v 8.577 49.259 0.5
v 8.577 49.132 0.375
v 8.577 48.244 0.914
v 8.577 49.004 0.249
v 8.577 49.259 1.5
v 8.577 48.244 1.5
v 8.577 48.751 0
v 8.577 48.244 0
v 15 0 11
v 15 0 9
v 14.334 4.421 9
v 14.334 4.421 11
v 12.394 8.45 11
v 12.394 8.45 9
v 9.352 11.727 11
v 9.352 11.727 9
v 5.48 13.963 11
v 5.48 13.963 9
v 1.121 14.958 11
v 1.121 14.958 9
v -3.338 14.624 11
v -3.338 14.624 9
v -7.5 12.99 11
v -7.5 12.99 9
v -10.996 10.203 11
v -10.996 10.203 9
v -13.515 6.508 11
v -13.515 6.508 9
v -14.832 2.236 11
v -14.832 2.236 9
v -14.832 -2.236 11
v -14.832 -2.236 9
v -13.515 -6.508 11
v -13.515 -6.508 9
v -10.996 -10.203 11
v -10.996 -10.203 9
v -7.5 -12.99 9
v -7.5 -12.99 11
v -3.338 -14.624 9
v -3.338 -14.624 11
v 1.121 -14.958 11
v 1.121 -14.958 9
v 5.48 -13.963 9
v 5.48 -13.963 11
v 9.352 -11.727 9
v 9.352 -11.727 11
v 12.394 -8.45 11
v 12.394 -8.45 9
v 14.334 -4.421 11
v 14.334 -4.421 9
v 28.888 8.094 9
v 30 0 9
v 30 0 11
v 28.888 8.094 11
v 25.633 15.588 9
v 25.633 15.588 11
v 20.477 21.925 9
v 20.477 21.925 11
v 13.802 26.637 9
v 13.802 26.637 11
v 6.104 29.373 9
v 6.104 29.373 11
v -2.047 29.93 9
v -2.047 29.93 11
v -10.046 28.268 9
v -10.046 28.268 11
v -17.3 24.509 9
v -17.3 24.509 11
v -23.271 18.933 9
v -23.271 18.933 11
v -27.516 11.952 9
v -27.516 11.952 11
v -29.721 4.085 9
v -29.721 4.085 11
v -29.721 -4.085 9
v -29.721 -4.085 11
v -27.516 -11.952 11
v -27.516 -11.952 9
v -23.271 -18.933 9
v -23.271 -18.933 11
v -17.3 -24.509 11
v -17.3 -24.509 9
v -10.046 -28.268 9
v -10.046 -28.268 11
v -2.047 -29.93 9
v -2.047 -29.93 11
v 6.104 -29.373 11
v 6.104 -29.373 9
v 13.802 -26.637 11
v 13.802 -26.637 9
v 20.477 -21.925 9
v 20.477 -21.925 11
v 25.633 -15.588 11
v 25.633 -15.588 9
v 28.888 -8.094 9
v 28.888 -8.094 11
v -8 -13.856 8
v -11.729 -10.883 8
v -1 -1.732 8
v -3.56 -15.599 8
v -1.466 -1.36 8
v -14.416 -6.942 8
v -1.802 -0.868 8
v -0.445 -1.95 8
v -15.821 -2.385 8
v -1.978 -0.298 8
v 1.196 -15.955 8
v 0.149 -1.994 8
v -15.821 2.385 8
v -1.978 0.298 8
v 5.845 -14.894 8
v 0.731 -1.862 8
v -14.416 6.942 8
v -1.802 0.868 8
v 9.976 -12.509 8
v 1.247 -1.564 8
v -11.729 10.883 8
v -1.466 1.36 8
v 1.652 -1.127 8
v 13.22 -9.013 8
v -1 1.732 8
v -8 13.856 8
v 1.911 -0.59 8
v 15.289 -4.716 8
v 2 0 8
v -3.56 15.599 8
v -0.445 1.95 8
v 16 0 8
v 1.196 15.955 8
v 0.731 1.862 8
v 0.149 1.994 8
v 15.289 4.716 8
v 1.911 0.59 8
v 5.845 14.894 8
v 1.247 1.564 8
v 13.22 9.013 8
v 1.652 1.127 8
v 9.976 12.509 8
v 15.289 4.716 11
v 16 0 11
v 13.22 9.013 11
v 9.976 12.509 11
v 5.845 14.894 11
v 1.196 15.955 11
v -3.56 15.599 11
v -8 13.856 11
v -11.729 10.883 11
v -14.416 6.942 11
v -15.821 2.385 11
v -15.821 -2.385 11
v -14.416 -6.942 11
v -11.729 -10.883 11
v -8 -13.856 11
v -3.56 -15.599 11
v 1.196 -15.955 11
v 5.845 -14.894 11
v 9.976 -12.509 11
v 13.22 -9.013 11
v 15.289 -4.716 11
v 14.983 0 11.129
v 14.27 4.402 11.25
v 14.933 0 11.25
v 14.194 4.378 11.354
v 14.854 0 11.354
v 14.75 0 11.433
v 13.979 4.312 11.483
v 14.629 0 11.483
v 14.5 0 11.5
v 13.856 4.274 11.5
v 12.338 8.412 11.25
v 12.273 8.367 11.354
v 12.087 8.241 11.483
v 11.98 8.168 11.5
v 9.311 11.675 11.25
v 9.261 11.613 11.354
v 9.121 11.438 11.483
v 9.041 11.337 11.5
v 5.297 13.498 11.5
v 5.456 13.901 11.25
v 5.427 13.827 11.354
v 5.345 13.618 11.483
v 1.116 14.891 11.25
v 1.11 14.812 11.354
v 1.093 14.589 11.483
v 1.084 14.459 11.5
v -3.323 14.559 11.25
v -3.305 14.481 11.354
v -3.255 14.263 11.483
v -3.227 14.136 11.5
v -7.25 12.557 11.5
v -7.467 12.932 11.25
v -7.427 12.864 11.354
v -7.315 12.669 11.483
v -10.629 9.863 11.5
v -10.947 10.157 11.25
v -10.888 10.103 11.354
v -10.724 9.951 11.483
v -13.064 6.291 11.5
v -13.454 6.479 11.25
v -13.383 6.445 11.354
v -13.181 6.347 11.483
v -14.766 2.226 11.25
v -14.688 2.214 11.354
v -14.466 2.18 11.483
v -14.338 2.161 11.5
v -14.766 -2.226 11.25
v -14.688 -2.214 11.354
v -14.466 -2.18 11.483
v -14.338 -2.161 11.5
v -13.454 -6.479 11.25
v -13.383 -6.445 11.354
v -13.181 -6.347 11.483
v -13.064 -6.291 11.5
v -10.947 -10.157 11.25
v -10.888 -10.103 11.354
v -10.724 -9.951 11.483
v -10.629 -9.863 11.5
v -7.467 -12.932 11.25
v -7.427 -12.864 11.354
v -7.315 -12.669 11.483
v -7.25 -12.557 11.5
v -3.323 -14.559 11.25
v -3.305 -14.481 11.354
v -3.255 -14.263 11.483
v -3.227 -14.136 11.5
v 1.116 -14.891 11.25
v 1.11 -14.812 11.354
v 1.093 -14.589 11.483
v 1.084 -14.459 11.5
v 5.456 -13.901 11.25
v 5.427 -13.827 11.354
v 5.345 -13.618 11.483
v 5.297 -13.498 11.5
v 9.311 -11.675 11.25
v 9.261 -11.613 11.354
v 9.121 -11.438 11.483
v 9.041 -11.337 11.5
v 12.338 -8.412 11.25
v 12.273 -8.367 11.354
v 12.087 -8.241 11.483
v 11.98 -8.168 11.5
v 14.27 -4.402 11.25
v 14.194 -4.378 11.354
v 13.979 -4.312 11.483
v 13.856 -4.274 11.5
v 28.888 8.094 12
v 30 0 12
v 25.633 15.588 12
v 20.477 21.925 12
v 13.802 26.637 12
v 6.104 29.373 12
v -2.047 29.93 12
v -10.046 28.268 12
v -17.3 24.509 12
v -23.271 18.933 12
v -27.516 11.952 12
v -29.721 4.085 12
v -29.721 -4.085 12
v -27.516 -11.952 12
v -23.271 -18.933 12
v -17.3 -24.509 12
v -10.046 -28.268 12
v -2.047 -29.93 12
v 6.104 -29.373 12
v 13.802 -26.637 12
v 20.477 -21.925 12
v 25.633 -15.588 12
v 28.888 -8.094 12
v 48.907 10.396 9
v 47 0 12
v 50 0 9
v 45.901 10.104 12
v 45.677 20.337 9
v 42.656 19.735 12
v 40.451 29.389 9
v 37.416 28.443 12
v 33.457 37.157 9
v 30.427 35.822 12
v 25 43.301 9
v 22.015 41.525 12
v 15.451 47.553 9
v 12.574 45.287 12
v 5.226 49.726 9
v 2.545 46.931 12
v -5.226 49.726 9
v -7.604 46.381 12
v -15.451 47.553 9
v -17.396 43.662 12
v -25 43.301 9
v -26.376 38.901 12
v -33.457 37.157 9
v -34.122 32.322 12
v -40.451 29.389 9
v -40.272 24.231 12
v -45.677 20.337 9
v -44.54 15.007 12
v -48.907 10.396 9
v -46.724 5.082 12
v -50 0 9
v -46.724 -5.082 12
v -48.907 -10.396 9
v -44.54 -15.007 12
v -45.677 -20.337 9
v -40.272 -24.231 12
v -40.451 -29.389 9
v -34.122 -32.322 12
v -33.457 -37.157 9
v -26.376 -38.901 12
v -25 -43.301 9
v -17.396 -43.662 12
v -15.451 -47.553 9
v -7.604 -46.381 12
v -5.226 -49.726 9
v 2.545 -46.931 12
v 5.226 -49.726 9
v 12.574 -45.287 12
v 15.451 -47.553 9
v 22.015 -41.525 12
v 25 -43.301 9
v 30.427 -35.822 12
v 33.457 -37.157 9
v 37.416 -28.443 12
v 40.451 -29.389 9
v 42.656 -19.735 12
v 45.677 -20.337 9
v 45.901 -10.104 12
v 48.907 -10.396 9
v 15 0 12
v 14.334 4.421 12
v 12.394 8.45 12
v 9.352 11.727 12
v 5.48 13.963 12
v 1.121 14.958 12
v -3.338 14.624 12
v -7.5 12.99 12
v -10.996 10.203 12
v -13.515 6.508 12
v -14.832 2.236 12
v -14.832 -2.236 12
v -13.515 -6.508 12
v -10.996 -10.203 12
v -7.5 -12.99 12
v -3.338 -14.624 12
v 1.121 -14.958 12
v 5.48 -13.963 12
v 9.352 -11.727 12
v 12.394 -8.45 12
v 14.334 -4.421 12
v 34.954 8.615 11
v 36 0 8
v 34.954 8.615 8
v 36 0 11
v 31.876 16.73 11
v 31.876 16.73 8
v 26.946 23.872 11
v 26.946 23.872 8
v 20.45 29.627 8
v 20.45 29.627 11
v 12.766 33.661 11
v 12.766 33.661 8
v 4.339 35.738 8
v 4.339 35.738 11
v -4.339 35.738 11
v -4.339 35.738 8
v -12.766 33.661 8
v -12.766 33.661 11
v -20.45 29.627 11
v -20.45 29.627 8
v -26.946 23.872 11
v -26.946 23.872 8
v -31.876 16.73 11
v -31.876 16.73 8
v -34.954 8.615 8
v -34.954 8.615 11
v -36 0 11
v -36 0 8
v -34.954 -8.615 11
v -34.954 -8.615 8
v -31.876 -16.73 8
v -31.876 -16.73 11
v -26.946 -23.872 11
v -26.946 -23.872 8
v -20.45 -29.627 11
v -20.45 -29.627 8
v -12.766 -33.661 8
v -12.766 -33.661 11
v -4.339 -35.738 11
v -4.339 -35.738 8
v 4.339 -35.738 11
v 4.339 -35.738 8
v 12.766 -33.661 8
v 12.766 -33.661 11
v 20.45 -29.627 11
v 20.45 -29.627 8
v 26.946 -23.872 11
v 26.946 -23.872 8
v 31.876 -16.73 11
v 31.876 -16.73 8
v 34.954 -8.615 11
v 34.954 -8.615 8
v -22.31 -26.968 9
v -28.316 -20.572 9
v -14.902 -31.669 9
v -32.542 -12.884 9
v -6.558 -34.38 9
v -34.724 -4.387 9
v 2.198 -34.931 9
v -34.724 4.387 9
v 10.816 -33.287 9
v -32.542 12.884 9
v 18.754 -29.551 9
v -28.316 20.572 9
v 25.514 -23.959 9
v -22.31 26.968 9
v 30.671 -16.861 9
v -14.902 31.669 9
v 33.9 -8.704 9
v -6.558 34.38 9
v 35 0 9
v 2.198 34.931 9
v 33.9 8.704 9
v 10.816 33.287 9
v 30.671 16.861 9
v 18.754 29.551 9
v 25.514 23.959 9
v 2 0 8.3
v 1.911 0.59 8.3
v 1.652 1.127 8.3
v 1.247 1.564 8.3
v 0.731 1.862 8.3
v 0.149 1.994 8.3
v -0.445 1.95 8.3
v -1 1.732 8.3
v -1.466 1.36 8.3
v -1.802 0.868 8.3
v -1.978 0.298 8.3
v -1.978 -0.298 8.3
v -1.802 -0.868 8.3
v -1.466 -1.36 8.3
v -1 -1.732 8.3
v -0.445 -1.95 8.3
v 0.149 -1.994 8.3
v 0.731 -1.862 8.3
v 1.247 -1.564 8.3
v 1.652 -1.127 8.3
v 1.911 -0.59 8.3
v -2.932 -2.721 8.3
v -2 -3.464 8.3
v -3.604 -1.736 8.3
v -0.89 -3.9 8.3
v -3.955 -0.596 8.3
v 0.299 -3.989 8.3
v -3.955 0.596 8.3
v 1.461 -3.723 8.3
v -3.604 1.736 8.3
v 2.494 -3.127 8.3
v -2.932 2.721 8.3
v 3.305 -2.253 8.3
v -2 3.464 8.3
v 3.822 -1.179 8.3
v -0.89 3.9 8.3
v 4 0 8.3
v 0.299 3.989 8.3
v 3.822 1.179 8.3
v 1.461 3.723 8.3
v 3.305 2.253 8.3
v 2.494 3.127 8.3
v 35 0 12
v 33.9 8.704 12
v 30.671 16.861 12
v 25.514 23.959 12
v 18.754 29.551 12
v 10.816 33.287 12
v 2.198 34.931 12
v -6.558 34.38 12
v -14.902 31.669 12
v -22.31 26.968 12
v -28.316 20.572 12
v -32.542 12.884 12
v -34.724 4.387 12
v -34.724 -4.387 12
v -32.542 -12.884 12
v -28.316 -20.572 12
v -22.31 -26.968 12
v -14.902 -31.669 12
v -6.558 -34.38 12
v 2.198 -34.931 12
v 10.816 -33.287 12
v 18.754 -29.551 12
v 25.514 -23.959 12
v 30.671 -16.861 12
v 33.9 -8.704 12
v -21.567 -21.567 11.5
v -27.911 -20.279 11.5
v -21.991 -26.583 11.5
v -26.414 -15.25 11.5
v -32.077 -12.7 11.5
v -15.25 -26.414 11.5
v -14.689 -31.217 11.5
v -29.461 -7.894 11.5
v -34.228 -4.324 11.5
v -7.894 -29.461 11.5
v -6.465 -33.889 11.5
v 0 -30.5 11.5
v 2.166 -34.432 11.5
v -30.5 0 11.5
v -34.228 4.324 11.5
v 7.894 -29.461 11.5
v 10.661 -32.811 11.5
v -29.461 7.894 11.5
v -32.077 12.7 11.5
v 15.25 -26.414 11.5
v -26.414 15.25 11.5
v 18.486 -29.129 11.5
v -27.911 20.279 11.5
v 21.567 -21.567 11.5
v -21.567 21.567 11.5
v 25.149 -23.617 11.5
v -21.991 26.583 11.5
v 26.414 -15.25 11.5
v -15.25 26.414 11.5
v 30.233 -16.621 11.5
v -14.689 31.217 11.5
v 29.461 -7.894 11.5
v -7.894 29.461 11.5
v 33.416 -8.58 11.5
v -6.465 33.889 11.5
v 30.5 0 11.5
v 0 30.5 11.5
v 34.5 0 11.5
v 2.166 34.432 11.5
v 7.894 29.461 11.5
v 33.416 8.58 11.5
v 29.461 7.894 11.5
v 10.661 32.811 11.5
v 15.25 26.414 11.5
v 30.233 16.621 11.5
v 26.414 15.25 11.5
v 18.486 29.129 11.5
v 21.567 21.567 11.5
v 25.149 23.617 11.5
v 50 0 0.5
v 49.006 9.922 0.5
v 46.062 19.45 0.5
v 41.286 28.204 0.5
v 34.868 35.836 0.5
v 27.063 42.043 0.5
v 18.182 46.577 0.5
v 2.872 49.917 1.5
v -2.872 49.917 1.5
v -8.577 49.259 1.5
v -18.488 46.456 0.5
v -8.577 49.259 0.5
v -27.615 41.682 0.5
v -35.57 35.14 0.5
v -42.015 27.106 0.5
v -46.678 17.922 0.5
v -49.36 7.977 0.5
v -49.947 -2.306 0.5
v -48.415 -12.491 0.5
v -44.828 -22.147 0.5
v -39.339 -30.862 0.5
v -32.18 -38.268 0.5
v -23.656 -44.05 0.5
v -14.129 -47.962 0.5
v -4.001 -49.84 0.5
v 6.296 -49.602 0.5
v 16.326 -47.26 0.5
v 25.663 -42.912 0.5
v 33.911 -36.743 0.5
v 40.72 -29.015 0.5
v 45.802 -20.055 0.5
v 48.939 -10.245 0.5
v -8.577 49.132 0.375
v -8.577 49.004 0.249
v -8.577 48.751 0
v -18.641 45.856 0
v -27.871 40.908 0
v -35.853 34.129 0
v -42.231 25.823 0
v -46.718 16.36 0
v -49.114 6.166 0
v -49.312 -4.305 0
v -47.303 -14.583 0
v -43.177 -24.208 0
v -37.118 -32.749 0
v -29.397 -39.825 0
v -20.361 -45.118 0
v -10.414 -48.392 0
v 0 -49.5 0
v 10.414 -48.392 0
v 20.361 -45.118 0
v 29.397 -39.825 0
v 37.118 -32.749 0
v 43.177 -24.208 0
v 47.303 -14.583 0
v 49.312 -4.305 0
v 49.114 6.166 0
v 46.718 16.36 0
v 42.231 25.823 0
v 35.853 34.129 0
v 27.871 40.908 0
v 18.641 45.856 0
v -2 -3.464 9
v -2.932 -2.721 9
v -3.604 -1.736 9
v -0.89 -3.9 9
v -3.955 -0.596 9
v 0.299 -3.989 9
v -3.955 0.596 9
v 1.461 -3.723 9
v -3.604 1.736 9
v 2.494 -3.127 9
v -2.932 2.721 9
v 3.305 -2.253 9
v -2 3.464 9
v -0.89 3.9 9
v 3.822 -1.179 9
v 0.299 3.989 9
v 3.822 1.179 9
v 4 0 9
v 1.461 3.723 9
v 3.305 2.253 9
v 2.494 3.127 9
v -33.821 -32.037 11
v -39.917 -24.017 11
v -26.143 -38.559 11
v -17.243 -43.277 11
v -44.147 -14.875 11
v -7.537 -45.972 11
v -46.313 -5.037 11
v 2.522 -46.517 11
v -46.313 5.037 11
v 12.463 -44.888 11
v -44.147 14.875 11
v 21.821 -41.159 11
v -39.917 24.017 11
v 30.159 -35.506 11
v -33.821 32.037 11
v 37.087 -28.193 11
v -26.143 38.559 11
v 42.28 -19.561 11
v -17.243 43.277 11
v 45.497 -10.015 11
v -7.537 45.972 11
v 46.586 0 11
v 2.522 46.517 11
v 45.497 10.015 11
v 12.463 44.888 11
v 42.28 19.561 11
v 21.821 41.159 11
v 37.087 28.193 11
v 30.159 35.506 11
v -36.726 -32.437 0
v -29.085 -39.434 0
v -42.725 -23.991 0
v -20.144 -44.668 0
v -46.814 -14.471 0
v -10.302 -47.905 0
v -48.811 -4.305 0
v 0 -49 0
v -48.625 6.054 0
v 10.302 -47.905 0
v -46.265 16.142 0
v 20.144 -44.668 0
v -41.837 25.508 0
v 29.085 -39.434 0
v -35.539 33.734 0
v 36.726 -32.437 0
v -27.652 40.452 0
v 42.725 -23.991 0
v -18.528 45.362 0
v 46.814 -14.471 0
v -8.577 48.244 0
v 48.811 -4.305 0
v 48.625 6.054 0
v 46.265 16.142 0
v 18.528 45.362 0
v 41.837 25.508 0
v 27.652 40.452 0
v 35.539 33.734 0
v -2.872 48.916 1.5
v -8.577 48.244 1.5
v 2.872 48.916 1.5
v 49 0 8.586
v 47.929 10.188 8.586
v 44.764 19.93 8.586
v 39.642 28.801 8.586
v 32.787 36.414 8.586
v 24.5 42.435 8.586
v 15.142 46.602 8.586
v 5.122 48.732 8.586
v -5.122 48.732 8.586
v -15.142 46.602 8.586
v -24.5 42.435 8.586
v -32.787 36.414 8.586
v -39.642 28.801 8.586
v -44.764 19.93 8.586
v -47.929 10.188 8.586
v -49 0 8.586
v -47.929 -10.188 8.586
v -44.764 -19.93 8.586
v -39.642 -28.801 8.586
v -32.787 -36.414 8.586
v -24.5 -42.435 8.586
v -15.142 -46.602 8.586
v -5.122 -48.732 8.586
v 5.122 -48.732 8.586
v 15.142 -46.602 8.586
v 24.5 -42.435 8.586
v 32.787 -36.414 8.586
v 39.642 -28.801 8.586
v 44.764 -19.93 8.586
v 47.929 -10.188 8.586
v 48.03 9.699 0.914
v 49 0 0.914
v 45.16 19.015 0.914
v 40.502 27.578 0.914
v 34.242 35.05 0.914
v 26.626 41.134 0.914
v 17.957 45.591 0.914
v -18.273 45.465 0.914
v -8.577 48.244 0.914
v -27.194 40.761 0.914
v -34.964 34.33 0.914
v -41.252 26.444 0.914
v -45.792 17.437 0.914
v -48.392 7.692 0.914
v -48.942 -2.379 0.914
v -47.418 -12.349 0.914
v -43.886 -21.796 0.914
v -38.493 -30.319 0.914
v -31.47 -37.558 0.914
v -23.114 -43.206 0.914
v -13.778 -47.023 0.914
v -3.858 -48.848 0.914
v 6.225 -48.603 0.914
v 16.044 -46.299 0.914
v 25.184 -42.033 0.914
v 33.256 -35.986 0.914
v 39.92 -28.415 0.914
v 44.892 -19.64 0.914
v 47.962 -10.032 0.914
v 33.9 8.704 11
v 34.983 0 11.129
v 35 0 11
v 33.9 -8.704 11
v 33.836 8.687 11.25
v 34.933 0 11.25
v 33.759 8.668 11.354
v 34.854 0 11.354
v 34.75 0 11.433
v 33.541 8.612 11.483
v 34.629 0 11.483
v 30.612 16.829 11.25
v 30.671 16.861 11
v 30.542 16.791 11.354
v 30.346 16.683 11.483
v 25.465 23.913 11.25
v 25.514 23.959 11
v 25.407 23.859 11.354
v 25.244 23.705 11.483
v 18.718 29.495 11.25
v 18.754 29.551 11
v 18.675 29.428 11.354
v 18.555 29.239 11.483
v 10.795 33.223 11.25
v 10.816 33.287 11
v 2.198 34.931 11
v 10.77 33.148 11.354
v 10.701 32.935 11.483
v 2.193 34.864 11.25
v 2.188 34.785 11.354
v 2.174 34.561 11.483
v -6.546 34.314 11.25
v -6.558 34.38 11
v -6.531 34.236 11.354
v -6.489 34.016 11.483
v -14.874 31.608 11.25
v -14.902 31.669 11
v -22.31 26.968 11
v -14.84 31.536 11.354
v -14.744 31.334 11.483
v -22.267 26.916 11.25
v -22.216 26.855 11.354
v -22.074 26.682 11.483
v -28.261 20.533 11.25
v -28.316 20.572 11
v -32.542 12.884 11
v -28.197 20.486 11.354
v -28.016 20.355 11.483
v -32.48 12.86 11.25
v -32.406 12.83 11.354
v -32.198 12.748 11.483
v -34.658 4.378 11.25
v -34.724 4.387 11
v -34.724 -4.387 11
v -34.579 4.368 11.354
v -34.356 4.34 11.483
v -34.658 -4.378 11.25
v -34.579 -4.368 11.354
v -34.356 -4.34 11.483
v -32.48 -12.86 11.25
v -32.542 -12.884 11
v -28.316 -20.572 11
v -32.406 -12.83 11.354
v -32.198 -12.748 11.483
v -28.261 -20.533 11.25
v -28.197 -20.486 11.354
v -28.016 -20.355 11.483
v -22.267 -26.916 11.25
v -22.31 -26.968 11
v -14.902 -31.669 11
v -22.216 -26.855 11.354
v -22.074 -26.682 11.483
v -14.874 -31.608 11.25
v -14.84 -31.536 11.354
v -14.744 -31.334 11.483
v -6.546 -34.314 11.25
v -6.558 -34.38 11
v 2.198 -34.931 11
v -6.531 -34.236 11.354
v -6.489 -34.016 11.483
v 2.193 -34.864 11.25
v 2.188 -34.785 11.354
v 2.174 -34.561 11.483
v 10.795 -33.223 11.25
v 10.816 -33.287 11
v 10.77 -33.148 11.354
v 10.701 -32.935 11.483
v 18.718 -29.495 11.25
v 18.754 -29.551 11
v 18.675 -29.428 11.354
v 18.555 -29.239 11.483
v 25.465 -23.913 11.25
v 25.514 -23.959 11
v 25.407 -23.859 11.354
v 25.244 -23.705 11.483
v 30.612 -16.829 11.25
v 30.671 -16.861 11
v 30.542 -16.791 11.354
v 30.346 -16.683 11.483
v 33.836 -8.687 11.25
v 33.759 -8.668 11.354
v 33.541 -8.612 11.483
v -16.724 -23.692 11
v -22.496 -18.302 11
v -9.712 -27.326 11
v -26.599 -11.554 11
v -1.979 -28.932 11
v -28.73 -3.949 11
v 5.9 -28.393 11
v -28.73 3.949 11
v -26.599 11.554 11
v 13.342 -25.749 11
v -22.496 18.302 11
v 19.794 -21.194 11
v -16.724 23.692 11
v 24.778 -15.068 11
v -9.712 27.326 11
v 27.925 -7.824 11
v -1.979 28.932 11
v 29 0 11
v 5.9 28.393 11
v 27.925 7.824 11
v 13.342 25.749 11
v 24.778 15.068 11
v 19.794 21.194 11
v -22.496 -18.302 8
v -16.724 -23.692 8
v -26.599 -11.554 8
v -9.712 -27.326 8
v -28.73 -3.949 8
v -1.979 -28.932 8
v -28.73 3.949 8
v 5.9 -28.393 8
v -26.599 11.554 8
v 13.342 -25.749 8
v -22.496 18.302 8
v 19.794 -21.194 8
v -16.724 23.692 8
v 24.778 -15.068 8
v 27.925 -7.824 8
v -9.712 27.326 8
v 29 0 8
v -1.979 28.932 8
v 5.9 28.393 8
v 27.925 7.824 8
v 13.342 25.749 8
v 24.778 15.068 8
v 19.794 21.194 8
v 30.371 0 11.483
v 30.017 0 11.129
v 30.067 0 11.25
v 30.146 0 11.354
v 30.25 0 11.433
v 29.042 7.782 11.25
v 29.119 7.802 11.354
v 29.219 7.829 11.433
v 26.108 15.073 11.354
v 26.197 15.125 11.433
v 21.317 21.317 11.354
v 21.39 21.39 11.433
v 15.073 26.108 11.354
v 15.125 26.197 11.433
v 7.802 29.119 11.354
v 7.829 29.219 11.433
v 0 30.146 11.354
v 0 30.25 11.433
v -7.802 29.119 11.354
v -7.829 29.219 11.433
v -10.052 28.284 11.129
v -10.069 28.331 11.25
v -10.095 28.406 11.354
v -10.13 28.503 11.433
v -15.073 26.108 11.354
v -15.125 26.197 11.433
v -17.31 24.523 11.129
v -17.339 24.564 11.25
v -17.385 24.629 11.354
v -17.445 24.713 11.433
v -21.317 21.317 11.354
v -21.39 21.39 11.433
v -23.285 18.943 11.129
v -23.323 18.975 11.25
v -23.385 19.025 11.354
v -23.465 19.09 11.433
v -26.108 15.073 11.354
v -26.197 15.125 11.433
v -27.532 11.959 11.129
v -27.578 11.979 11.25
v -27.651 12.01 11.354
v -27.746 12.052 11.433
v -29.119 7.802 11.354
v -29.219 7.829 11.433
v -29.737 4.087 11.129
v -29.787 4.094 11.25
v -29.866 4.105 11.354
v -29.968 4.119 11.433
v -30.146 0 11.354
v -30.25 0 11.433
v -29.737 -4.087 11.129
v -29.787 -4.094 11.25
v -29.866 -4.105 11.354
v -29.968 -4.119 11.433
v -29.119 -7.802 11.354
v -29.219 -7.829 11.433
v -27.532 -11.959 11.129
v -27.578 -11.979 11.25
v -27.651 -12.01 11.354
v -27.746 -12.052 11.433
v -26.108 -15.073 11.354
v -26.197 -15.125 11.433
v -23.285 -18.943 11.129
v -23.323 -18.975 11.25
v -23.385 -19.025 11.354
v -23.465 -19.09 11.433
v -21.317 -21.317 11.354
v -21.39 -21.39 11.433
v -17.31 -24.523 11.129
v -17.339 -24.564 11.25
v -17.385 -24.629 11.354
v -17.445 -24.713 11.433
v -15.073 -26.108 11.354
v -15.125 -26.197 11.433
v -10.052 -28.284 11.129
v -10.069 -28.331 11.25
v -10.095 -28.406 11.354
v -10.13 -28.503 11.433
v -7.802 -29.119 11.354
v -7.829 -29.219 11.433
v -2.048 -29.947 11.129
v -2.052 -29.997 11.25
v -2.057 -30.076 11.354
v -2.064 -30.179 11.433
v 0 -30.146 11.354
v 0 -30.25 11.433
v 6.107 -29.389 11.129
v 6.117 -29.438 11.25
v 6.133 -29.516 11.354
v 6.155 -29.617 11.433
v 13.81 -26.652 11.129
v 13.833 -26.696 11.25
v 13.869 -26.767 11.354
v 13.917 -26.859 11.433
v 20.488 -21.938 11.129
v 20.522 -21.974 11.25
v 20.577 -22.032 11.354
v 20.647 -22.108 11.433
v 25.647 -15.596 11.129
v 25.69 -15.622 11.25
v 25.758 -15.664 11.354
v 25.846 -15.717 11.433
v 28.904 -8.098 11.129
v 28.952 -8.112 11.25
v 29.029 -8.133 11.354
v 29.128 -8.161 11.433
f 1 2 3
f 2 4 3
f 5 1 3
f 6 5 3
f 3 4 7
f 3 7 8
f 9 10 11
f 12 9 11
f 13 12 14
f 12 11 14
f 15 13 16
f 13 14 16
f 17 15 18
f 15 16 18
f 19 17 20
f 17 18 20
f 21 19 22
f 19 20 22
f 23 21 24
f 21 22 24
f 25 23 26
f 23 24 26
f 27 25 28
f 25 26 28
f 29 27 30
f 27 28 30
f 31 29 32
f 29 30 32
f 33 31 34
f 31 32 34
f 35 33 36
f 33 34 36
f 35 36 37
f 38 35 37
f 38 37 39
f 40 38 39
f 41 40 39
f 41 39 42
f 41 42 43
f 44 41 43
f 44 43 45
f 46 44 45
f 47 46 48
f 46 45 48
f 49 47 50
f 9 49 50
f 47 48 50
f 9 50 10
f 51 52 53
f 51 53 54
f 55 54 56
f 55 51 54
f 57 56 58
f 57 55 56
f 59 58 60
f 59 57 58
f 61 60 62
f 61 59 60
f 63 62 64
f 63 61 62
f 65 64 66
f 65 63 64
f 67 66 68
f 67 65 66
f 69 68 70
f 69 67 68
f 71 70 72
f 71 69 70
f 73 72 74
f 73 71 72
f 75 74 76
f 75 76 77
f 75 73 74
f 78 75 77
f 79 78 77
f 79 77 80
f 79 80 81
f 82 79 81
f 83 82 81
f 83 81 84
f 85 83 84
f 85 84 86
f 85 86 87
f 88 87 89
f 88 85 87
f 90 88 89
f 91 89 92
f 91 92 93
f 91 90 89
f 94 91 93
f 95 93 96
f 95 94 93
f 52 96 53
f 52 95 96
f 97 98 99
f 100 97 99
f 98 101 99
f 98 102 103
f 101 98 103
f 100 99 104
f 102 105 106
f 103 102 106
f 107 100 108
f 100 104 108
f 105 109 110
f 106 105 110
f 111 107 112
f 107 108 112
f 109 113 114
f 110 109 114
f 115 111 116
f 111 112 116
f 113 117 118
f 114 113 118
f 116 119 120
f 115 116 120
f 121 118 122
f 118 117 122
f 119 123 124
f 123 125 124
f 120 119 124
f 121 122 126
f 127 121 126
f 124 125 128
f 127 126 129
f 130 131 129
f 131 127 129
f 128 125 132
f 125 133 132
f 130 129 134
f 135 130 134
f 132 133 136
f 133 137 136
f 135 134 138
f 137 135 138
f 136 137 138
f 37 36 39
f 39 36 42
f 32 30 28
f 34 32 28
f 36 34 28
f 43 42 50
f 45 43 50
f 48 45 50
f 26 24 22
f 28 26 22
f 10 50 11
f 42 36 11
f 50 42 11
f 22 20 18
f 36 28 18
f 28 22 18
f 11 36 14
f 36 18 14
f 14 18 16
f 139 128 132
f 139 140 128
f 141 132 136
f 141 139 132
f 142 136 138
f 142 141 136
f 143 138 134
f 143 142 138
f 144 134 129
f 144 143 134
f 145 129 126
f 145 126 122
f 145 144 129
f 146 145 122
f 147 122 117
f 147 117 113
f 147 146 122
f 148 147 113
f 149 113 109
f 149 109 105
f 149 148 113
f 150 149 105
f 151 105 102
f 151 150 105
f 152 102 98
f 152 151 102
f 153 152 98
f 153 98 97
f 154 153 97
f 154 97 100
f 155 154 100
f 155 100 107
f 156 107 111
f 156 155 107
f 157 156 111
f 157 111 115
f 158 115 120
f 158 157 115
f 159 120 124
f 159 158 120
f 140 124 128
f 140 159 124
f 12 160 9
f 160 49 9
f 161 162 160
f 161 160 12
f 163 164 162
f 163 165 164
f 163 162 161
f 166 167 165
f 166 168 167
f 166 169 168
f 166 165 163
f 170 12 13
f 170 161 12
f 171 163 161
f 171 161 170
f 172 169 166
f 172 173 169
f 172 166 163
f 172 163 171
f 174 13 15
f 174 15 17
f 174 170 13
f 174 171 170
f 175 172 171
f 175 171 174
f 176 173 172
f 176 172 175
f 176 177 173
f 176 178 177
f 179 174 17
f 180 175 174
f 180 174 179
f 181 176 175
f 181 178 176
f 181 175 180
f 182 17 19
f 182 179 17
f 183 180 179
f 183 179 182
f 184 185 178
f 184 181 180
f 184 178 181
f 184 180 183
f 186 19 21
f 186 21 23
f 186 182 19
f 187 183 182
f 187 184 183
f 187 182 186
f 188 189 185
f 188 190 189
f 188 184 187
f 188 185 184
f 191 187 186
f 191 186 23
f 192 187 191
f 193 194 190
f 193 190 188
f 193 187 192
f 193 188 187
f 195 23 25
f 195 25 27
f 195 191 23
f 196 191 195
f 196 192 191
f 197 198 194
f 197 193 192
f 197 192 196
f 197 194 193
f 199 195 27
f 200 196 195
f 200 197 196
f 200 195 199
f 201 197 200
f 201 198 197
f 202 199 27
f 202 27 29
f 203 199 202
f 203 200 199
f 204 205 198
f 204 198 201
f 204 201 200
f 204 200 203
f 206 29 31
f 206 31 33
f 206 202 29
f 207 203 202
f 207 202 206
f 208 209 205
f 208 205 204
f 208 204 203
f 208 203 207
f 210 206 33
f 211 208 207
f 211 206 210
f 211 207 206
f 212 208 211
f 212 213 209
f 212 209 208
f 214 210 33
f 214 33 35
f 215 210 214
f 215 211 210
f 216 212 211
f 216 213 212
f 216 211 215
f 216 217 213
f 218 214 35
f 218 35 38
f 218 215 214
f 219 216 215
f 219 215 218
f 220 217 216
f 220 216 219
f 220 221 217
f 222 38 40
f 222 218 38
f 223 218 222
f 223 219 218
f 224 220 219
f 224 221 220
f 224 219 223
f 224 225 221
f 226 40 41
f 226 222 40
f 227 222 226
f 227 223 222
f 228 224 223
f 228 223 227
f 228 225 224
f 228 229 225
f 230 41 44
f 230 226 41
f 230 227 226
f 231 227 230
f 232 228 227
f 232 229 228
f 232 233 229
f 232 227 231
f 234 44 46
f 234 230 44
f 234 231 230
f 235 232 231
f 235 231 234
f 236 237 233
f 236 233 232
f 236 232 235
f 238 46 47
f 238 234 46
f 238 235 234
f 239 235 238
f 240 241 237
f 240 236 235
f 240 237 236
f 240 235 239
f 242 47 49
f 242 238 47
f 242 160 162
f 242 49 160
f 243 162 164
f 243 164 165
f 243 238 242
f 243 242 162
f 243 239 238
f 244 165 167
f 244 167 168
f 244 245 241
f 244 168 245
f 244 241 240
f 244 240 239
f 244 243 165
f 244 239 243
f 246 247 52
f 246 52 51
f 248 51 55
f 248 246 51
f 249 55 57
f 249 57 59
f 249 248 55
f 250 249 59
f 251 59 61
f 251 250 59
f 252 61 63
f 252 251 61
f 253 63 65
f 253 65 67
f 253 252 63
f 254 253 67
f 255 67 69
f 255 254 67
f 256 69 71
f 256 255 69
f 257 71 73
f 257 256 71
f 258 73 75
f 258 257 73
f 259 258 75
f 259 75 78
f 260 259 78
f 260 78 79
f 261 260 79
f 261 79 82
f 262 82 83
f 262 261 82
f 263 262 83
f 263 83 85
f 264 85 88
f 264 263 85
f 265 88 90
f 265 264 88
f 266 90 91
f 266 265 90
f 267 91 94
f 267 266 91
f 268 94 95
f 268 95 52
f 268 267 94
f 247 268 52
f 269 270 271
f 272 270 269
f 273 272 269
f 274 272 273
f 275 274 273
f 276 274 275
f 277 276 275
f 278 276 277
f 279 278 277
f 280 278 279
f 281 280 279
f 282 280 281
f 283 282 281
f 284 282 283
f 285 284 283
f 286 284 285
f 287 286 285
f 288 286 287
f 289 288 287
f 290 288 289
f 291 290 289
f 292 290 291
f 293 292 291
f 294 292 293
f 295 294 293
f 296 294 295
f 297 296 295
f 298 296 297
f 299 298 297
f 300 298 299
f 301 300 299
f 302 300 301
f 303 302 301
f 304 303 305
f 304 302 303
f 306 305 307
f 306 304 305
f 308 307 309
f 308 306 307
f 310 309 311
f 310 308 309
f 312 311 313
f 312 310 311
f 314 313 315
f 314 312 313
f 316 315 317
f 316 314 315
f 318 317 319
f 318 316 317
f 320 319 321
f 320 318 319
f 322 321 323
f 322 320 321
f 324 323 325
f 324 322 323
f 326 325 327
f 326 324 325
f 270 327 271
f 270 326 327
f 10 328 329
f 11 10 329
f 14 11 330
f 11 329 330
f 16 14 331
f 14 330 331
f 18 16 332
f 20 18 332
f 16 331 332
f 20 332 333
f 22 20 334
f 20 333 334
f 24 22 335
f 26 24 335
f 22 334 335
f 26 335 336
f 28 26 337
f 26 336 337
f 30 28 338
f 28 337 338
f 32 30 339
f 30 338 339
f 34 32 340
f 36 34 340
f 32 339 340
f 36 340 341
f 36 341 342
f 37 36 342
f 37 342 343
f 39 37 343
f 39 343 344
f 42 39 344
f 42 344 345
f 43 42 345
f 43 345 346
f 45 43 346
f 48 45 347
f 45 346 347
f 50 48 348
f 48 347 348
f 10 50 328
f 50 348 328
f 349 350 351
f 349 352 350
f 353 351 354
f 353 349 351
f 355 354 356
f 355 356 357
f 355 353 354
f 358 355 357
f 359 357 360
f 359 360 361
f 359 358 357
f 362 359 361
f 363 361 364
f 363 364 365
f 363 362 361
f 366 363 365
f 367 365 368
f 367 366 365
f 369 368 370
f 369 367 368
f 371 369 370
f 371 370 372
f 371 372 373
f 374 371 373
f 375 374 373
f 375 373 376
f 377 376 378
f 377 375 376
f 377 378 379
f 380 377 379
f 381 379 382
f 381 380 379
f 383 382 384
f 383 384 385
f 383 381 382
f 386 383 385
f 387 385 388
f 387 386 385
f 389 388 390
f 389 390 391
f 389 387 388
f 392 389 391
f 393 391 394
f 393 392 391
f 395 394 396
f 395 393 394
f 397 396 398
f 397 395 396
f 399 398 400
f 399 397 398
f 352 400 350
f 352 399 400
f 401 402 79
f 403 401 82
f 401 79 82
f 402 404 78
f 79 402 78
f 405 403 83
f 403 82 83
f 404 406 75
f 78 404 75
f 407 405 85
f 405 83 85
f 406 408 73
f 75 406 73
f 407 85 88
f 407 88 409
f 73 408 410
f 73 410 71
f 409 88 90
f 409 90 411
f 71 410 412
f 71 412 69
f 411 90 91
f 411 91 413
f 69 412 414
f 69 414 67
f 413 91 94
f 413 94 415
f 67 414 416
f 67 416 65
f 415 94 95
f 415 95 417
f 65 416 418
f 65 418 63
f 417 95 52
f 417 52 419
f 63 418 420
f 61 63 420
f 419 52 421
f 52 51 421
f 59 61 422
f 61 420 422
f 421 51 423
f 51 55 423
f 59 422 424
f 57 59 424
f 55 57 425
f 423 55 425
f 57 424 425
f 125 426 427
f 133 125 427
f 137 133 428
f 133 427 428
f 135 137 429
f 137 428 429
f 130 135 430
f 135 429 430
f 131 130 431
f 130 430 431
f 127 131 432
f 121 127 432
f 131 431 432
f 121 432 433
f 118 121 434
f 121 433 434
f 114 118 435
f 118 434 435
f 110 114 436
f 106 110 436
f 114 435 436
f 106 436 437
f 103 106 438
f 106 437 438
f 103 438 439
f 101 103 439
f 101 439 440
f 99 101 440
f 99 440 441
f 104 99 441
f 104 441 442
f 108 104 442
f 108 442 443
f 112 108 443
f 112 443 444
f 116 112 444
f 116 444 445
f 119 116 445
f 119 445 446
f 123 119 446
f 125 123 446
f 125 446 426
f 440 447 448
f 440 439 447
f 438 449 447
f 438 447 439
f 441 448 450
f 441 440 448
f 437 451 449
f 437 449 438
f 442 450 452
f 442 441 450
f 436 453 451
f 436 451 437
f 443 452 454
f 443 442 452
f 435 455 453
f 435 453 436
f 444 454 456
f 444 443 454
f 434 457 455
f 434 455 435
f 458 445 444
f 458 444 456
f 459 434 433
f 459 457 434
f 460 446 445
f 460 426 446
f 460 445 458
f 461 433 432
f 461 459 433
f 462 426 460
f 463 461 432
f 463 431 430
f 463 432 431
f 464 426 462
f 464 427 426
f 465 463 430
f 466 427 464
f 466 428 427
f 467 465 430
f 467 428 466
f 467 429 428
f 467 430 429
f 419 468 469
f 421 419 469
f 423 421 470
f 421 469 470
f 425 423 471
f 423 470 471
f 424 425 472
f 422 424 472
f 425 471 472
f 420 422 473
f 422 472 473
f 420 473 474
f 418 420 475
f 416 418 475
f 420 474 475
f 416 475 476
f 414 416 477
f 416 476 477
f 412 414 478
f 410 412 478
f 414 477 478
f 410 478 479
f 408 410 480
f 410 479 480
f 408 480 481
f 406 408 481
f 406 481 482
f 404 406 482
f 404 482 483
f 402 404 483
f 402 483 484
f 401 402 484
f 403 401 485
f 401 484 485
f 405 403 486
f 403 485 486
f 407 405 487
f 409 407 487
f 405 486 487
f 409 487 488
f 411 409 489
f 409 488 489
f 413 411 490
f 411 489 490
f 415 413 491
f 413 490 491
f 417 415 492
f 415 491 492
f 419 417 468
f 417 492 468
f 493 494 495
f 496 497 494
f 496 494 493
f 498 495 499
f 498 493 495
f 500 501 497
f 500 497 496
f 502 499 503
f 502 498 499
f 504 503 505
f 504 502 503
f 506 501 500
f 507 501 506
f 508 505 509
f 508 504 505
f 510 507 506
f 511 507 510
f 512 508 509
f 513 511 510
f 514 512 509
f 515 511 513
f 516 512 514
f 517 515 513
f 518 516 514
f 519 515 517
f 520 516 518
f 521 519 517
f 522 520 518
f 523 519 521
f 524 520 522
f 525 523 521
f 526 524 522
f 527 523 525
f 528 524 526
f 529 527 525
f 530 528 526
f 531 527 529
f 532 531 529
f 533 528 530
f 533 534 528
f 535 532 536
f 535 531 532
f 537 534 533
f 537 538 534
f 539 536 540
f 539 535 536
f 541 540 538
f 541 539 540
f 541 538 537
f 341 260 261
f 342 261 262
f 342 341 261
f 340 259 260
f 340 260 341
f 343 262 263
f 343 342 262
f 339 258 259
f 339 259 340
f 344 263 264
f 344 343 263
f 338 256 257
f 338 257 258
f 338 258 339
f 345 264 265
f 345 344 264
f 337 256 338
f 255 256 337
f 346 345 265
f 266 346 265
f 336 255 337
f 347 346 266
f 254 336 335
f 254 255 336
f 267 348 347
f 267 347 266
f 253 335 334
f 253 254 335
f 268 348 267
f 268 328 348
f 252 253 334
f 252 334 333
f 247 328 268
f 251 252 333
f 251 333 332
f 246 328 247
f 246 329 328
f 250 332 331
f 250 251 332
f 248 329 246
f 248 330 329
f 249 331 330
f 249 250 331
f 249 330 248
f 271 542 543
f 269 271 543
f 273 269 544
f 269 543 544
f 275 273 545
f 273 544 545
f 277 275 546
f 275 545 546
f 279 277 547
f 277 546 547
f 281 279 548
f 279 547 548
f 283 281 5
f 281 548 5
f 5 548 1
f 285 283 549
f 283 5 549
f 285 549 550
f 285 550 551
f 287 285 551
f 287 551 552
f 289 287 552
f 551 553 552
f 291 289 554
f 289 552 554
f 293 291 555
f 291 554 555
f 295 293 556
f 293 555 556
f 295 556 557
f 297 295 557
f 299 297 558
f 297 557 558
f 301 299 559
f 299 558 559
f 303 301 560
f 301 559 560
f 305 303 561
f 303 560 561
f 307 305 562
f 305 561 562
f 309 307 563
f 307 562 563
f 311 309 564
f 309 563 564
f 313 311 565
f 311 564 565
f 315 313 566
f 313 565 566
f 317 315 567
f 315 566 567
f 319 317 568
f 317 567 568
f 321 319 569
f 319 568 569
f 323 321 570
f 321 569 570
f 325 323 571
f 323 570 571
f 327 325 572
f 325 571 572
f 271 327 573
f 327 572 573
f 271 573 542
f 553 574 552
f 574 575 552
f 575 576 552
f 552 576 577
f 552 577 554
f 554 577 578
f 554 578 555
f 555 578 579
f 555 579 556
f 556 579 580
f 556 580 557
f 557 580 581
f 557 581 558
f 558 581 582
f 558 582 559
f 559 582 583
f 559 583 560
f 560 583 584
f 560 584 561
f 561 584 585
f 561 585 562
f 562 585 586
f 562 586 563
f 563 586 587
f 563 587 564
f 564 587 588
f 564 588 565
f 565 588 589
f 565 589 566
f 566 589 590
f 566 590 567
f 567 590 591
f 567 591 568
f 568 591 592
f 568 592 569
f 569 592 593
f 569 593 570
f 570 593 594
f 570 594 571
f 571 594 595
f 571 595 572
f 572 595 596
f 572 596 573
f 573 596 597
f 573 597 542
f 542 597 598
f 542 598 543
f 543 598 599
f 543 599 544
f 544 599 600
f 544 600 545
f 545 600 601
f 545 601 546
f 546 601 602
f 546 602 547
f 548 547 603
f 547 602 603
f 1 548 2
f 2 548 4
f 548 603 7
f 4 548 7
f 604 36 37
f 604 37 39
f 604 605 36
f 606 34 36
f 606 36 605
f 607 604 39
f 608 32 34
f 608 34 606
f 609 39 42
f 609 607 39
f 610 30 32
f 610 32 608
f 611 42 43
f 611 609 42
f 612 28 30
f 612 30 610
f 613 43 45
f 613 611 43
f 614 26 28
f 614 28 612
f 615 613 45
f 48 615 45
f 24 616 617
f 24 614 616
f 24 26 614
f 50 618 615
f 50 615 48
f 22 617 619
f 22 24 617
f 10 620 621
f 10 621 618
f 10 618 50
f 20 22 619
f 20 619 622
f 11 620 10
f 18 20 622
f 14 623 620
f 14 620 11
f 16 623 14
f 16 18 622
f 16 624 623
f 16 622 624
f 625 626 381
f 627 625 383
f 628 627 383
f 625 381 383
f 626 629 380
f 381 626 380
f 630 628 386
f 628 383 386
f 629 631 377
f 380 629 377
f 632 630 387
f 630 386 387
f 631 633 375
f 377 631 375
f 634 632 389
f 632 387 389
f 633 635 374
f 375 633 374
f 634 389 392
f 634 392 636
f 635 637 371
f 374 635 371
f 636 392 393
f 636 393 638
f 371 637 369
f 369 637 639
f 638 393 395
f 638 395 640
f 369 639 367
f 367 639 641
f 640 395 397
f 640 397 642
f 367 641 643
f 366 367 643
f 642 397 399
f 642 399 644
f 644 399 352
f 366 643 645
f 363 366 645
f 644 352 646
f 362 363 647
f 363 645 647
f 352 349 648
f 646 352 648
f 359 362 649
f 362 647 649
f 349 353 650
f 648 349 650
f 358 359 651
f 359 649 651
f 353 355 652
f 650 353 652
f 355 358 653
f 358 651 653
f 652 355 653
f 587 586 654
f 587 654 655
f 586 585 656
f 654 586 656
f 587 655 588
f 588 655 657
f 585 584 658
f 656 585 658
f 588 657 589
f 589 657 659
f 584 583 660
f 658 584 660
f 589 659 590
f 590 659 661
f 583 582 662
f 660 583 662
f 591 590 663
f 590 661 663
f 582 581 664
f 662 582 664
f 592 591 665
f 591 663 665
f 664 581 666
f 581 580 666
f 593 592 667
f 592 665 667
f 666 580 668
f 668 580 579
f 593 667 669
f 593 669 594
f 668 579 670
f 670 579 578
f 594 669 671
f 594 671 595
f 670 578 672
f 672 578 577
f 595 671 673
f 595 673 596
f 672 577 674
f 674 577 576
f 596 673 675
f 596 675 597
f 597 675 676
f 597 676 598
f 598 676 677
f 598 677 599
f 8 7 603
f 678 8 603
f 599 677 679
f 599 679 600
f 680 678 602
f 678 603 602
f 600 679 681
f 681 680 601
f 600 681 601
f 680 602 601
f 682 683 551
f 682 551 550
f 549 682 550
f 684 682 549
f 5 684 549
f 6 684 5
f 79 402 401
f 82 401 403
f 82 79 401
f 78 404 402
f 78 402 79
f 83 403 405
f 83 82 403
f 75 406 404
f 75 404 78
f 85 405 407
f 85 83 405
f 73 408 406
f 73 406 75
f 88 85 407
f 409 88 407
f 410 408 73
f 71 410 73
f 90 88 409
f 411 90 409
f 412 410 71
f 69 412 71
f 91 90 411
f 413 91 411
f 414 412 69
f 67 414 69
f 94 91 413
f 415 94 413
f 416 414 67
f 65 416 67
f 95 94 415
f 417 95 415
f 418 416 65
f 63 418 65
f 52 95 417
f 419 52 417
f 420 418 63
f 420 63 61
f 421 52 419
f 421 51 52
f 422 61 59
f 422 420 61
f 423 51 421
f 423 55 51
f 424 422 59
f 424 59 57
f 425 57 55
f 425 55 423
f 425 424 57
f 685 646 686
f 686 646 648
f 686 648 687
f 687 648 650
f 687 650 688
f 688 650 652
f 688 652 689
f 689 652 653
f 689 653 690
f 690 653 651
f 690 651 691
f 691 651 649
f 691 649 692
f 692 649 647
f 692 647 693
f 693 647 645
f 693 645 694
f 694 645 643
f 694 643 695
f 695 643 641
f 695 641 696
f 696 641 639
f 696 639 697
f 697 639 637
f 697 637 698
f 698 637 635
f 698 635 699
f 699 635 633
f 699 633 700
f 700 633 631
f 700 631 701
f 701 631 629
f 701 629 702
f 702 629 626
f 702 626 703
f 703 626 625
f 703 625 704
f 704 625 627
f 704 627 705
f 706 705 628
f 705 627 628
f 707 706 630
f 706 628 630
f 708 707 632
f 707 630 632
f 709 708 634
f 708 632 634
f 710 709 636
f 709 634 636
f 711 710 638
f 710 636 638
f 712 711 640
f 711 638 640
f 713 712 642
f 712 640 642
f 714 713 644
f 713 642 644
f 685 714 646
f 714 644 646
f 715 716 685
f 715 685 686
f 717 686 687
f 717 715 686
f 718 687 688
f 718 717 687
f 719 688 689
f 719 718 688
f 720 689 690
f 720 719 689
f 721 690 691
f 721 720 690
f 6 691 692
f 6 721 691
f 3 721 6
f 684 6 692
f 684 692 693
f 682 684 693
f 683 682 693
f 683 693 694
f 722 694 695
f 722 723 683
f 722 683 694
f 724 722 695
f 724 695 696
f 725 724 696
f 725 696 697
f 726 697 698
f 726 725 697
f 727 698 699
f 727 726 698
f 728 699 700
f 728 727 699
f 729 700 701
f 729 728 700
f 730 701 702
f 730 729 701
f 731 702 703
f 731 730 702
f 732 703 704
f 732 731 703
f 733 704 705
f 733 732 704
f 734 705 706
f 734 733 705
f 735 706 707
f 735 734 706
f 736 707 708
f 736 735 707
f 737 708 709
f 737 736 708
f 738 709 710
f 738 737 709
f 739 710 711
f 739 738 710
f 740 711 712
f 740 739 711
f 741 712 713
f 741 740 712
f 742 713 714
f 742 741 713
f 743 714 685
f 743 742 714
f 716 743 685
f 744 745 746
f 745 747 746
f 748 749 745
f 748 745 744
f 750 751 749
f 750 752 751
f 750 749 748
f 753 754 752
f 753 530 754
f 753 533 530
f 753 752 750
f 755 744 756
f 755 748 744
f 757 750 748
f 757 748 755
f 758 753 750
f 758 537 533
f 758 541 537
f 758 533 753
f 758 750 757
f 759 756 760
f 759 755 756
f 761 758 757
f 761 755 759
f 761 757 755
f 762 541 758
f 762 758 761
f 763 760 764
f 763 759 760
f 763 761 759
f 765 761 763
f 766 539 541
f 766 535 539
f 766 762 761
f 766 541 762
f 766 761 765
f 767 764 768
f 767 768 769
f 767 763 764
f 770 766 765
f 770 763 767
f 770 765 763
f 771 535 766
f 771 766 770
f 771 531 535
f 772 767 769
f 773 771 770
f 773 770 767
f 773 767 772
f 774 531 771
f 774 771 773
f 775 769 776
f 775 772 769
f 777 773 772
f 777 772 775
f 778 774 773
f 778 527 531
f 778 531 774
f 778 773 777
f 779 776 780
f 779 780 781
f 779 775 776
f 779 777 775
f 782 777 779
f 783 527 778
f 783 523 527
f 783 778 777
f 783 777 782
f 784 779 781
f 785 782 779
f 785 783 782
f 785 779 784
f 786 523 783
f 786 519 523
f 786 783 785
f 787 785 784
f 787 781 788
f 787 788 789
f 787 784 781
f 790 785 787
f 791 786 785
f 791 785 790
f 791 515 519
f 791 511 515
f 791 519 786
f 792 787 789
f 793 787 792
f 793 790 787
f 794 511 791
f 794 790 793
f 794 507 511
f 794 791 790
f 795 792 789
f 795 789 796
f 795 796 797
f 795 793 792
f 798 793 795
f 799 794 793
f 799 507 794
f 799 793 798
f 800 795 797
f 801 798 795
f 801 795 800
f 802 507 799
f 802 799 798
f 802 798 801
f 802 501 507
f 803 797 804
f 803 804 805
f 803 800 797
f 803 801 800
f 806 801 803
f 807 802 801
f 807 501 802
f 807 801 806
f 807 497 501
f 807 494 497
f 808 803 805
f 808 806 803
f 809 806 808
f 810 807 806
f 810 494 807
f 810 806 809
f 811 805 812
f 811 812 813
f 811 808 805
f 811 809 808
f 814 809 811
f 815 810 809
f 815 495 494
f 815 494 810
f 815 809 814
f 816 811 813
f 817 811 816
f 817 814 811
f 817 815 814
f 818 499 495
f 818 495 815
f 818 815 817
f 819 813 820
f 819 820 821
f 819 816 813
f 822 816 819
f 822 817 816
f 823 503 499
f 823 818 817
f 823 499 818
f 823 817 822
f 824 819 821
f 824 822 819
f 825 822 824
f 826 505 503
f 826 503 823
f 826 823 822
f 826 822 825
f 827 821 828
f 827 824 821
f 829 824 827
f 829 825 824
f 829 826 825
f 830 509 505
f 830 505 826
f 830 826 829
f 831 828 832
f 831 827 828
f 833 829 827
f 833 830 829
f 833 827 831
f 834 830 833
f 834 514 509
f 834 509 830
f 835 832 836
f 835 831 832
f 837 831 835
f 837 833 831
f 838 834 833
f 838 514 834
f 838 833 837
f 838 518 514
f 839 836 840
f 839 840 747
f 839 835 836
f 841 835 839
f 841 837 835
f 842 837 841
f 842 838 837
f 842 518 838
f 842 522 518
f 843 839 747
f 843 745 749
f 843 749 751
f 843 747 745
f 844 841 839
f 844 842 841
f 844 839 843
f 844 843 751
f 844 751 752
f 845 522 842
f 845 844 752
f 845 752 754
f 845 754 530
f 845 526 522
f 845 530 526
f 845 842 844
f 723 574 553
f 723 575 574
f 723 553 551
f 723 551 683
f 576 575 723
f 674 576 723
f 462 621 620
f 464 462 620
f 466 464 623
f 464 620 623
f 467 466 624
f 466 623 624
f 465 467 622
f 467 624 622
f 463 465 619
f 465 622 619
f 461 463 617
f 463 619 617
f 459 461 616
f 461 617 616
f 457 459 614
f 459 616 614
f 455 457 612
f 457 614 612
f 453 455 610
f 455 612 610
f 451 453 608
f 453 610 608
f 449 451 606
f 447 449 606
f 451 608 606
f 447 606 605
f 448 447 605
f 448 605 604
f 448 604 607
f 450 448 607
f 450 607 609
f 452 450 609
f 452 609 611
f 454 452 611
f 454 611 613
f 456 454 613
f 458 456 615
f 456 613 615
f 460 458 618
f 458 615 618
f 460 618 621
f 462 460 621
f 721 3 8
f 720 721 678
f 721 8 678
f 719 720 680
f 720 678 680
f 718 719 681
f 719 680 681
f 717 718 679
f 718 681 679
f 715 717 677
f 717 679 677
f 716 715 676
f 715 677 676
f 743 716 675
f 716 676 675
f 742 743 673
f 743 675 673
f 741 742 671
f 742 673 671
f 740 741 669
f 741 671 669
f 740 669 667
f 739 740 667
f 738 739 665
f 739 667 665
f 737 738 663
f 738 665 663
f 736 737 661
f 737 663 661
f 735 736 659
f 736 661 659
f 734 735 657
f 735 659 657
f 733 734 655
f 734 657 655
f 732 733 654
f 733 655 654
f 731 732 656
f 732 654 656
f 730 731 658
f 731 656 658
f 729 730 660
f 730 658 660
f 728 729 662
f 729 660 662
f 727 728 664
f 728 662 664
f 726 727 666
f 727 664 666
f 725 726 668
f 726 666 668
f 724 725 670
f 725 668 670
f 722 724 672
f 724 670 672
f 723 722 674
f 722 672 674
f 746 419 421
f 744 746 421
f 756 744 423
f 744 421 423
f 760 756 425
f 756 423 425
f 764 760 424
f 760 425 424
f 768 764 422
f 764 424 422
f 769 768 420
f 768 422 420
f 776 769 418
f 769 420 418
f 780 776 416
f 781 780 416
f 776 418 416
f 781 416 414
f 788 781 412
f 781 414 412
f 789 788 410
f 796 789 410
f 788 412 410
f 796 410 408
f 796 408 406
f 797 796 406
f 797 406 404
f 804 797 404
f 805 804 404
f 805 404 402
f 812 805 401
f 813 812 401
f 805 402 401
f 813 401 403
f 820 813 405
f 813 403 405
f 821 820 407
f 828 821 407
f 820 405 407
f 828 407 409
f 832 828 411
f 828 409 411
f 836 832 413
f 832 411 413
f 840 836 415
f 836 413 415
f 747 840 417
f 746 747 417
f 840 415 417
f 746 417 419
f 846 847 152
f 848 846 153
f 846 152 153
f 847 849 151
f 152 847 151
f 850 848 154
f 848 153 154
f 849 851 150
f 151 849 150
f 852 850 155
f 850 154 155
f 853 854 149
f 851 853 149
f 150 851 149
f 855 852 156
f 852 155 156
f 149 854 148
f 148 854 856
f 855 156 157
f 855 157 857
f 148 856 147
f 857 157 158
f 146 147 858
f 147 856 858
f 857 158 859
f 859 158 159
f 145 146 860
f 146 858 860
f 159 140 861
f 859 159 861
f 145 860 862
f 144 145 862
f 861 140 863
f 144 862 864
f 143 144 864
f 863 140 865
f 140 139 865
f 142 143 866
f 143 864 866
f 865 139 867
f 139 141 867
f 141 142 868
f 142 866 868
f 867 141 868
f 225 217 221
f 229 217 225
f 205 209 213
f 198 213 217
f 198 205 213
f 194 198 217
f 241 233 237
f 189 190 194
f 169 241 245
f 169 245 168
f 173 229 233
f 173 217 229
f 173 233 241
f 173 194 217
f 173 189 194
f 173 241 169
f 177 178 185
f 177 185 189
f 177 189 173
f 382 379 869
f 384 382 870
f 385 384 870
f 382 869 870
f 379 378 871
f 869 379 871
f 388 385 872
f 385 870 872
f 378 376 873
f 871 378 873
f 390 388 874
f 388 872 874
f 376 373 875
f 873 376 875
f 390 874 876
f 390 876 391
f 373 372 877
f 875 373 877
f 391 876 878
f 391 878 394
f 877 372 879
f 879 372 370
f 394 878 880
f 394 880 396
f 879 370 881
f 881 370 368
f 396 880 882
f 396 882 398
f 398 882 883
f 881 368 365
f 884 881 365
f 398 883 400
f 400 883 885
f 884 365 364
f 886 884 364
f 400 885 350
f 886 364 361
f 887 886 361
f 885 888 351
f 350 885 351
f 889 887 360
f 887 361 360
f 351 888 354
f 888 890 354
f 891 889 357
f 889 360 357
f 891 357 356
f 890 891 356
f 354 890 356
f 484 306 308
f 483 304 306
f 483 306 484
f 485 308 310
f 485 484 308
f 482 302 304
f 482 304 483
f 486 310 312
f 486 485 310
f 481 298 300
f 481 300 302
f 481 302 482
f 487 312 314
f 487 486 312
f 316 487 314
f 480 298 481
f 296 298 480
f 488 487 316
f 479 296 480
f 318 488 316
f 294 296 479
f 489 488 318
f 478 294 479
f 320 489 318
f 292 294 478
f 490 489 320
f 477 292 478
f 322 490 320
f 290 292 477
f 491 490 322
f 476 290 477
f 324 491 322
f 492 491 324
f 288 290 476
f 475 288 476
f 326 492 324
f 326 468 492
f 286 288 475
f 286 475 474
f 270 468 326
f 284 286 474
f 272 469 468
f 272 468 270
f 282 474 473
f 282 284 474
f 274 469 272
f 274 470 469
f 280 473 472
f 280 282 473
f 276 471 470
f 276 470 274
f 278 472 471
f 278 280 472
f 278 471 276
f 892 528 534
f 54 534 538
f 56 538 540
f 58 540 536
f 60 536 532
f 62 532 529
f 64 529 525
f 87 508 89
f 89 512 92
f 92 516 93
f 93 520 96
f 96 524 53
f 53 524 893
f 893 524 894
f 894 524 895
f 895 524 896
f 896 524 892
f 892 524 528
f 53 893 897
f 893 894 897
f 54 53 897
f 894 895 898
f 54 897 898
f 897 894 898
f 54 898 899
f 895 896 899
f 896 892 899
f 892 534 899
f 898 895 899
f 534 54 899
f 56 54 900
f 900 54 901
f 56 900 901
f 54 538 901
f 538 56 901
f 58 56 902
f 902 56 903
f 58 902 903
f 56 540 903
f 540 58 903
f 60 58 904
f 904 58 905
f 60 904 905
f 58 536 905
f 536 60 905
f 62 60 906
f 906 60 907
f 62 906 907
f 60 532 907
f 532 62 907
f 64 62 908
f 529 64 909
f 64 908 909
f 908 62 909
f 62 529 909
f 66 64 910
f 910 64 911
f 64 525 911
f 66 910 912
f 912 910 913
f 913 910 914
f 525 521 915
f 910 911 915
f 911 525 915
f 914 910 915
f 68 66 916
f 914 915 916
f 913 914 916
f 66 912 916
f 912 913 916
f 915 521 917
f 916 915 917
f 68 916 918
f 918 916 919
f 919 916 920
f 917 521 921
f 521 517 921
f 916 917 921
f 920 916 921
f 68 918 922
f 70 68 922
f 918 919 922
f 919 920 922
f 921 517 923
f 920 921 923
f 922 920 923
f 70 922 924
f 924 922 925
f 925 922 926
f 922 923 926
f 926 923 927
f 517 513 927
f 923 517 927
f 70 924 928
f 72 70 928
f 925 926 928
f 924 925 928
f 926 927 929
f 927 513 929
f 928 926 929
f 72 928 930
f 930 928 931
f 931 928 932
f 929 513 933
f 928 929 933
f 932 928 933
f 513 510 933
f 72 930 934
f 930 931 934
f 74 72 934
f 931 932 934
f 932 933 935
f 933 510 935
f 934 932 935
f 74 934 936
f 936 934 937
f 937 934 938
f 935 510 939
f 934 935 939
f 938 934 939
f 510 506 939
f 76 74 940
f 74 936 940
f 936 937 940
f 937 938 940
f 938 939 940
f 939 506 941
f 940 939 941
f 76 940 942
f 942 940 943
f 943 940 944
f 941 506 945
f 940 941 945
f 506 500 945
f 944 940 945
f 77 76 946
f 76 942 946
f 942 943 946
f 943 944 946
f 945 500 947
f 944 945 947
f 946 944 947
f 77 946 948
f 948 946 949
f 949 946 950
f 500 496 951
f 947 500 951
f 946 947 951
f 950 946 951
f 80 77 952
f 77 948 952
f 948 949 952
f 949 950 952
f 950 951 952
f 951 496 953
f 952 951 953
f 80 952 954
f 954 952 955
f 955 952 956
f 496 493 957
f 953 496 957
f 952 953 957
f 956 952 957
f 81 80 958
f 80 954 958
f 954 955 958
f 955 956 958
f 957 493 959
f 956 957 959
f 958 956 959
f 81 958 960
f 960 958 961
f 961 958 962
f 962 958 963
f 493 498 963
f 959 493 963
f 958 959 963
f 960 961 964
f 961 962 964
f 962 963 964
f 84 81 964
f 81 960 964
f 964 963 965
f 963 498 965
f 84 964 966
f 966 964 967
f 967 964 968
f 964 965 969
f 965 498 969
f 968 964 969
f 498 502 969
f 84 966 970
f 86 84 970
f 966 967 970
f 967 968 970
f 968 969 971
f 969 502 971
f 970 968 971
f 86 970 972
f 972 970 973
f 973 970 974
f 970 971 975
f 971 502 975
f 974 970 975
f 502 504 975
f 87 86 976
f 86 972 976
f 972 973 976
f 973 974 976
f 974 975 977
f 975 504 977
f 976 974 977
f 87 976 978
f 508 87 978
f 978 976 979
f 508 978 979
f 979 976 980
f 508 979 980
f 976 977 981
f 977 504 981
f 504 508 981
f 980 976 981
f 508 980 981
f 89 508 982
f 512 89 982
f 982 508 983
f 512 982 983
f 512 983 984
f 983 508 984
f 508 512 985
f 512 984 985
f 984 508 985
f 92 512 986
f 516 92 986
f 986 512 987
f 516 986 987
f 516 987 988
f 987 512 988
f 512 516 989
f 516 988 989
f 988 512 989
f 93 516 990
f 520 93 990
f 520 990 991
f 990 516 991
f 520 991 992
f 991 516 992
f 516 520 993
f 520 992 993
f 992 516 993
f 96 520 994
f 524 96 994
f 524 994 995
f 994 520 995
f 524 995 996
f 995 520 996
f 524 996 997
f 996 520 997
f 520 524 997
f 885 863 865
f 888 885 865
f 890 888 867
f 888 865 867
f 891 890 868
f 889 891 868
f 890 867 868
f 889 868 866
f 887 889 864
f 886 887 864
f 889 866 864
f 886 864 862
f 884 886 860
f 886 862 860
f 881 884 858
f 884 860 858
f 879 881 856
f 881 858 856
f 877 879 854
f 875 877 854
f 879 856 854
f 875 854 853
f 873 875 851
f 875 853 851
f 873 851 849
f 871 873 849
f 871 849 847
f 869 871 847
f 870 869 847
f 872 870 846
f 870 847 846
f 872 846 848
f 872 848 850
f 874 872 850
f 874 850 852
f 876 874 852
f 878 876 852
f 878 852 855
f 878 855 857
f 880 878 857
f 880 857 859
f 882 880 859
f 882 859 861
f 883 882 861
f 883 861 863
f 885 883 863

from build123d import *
from build123d import SkipClean  # not in build123d's __all__

# Parameters (mm, degrees)
F0_R      = 50
F1_DEPTH  = 12
F2_SIZE   = 3
F3_SIZE   = 0.5
F4_R      = 35
F4_R_2    = 30
F4_R_3    = 15
F5_DEPTH  = 3
F6_R      = 35
F6_R_2    = 30
F7_DEPTH  = 2.5
F6_R_3    = 15
F8_R      = 0.5
F9_R      = 0.5
F10_T     = -1
F11_W     = 17.1537045389
F11_H     = 3.4956783056
F12_DEPTH = 1.5
F13_R     = 4
F14_DEPTH = 0.7
F15_R     = 2
F16_DEPTH = 8.301


with BuildPart() as f1:
    # F0 (on Top) → F1 (new body)
    with BuildSketch(Plane.XY):
        Circle(F0_R)
    extrude(amount=F1_DEPTH)

    # F2
    f2_edges = [f1.edges().sort_by_distance(p)[0] for p in [
        (-50, 0, 12),
    ]]
    chamfer(f2_edges, length=F2_SIZE)

    # F3
    f3_edges = [f1.edges().sort_by_distance(p)[0] for p in [
        (-50, 0, 0),
    ]]
    chamfer(f3_edges, length=F3_SIZE)

    # F4 (on face) → F5 (cut)
    with BuildSketch(Plane.XY.offset(12)):
        Circle(F4_R)
        Circle(F4_R_2, mode=Mode.SUBTRACT)
        Circle(F4_R_3)
    extrude(amount=-F5_DEPTH, mode=Mode.SUBTRACT)

    # F10
    f10_openings = [f1.faces().sort_by_distance(p)[0] for p in [
        (0, 0, 0),
    ]]
    offset(amount=F10_T, openings=f10_openings, kind=Kind.INTERSECTION)

    # F11 (on face) → F12 (cut)
    with BuildSketch(Plane(origin=(0, 0, 0), x_dir=(1, 0, 0), z_dir=(0, 0, -1))):
        with Locations((0, -48.7780682743)):
            Rectangle(F11_W, F11_H)
    extrude(amount=-F12_DEPTH, mode=Mode.SUBTRACT)

    # F13 (on face) → F14 (cut)
    with BuildSketch(Plane.XY.offset(9)):
        Circle(F13_R)
    extrude(amount=-F14_DEPTH, mode=Mode.SUBTRACT)

    # F15 (on face) → F16 (cut, through all)
    with BuildSketch(Plane.XY.offset(8.3)):
        Circle(F15_R)
    extrude(amount=-F16_DEPTH, mode=Mode.SUBTRACT)

    # F18 (on face) → F19 (revolve, cut)
    with BuildSketch(Plane(origin=(8.5768522695, 0, 0), x_dir=(0, -1, 0), z_dir=(-1, 0, 0))):
        Polygon((-47.3146960518, 0), (-48.2435239711, 0.9142135624), (-48.2435239711, 0), align=None)
    with SkipClean():  # cleaning this boolean's faces spoils the solid; the shape is the same uncleaned
        revolve(axis=Axis((0, 0, 0.4506437108), (0, 0, -1)), mode=Mode.SUBTRACT)


with BuildPart() as f7:
    # F6 (on face) → F7 (new body)
    with BuildSketch(Plane.XY.offset(9)):
        Circle(F6_R)
        Circle(F6_R_2, mode=Mode.SUBTRACT)
    extrude(amount=F7_DEPTH)

    # F8
    f8_edges = [f7.edges().sort_by_distance(p)[0] for p in [
        (-35, 0, 11.5),
        (-30, 0, 11.5),
    ]]
    fillet(f8_edges, radius=F8_R)


with BuildPart() as f7b:
    # F6 (on face) → F7, piece 2 (new body)
    with BuildSketch(Plane.XY.offset(9)):
        Circle(F6_R_3)
    extrude(amount=F7_DEPTH)

    # F9
    f9_edges = [f7b.edges().sort_by_distance(p)[0] for p in [
        (-15, 0, 11.5),
    ]]
    fillet(f9_edges, radius=F9_R)


solid = Compound([f1.part, f7.part, f7b.part])
